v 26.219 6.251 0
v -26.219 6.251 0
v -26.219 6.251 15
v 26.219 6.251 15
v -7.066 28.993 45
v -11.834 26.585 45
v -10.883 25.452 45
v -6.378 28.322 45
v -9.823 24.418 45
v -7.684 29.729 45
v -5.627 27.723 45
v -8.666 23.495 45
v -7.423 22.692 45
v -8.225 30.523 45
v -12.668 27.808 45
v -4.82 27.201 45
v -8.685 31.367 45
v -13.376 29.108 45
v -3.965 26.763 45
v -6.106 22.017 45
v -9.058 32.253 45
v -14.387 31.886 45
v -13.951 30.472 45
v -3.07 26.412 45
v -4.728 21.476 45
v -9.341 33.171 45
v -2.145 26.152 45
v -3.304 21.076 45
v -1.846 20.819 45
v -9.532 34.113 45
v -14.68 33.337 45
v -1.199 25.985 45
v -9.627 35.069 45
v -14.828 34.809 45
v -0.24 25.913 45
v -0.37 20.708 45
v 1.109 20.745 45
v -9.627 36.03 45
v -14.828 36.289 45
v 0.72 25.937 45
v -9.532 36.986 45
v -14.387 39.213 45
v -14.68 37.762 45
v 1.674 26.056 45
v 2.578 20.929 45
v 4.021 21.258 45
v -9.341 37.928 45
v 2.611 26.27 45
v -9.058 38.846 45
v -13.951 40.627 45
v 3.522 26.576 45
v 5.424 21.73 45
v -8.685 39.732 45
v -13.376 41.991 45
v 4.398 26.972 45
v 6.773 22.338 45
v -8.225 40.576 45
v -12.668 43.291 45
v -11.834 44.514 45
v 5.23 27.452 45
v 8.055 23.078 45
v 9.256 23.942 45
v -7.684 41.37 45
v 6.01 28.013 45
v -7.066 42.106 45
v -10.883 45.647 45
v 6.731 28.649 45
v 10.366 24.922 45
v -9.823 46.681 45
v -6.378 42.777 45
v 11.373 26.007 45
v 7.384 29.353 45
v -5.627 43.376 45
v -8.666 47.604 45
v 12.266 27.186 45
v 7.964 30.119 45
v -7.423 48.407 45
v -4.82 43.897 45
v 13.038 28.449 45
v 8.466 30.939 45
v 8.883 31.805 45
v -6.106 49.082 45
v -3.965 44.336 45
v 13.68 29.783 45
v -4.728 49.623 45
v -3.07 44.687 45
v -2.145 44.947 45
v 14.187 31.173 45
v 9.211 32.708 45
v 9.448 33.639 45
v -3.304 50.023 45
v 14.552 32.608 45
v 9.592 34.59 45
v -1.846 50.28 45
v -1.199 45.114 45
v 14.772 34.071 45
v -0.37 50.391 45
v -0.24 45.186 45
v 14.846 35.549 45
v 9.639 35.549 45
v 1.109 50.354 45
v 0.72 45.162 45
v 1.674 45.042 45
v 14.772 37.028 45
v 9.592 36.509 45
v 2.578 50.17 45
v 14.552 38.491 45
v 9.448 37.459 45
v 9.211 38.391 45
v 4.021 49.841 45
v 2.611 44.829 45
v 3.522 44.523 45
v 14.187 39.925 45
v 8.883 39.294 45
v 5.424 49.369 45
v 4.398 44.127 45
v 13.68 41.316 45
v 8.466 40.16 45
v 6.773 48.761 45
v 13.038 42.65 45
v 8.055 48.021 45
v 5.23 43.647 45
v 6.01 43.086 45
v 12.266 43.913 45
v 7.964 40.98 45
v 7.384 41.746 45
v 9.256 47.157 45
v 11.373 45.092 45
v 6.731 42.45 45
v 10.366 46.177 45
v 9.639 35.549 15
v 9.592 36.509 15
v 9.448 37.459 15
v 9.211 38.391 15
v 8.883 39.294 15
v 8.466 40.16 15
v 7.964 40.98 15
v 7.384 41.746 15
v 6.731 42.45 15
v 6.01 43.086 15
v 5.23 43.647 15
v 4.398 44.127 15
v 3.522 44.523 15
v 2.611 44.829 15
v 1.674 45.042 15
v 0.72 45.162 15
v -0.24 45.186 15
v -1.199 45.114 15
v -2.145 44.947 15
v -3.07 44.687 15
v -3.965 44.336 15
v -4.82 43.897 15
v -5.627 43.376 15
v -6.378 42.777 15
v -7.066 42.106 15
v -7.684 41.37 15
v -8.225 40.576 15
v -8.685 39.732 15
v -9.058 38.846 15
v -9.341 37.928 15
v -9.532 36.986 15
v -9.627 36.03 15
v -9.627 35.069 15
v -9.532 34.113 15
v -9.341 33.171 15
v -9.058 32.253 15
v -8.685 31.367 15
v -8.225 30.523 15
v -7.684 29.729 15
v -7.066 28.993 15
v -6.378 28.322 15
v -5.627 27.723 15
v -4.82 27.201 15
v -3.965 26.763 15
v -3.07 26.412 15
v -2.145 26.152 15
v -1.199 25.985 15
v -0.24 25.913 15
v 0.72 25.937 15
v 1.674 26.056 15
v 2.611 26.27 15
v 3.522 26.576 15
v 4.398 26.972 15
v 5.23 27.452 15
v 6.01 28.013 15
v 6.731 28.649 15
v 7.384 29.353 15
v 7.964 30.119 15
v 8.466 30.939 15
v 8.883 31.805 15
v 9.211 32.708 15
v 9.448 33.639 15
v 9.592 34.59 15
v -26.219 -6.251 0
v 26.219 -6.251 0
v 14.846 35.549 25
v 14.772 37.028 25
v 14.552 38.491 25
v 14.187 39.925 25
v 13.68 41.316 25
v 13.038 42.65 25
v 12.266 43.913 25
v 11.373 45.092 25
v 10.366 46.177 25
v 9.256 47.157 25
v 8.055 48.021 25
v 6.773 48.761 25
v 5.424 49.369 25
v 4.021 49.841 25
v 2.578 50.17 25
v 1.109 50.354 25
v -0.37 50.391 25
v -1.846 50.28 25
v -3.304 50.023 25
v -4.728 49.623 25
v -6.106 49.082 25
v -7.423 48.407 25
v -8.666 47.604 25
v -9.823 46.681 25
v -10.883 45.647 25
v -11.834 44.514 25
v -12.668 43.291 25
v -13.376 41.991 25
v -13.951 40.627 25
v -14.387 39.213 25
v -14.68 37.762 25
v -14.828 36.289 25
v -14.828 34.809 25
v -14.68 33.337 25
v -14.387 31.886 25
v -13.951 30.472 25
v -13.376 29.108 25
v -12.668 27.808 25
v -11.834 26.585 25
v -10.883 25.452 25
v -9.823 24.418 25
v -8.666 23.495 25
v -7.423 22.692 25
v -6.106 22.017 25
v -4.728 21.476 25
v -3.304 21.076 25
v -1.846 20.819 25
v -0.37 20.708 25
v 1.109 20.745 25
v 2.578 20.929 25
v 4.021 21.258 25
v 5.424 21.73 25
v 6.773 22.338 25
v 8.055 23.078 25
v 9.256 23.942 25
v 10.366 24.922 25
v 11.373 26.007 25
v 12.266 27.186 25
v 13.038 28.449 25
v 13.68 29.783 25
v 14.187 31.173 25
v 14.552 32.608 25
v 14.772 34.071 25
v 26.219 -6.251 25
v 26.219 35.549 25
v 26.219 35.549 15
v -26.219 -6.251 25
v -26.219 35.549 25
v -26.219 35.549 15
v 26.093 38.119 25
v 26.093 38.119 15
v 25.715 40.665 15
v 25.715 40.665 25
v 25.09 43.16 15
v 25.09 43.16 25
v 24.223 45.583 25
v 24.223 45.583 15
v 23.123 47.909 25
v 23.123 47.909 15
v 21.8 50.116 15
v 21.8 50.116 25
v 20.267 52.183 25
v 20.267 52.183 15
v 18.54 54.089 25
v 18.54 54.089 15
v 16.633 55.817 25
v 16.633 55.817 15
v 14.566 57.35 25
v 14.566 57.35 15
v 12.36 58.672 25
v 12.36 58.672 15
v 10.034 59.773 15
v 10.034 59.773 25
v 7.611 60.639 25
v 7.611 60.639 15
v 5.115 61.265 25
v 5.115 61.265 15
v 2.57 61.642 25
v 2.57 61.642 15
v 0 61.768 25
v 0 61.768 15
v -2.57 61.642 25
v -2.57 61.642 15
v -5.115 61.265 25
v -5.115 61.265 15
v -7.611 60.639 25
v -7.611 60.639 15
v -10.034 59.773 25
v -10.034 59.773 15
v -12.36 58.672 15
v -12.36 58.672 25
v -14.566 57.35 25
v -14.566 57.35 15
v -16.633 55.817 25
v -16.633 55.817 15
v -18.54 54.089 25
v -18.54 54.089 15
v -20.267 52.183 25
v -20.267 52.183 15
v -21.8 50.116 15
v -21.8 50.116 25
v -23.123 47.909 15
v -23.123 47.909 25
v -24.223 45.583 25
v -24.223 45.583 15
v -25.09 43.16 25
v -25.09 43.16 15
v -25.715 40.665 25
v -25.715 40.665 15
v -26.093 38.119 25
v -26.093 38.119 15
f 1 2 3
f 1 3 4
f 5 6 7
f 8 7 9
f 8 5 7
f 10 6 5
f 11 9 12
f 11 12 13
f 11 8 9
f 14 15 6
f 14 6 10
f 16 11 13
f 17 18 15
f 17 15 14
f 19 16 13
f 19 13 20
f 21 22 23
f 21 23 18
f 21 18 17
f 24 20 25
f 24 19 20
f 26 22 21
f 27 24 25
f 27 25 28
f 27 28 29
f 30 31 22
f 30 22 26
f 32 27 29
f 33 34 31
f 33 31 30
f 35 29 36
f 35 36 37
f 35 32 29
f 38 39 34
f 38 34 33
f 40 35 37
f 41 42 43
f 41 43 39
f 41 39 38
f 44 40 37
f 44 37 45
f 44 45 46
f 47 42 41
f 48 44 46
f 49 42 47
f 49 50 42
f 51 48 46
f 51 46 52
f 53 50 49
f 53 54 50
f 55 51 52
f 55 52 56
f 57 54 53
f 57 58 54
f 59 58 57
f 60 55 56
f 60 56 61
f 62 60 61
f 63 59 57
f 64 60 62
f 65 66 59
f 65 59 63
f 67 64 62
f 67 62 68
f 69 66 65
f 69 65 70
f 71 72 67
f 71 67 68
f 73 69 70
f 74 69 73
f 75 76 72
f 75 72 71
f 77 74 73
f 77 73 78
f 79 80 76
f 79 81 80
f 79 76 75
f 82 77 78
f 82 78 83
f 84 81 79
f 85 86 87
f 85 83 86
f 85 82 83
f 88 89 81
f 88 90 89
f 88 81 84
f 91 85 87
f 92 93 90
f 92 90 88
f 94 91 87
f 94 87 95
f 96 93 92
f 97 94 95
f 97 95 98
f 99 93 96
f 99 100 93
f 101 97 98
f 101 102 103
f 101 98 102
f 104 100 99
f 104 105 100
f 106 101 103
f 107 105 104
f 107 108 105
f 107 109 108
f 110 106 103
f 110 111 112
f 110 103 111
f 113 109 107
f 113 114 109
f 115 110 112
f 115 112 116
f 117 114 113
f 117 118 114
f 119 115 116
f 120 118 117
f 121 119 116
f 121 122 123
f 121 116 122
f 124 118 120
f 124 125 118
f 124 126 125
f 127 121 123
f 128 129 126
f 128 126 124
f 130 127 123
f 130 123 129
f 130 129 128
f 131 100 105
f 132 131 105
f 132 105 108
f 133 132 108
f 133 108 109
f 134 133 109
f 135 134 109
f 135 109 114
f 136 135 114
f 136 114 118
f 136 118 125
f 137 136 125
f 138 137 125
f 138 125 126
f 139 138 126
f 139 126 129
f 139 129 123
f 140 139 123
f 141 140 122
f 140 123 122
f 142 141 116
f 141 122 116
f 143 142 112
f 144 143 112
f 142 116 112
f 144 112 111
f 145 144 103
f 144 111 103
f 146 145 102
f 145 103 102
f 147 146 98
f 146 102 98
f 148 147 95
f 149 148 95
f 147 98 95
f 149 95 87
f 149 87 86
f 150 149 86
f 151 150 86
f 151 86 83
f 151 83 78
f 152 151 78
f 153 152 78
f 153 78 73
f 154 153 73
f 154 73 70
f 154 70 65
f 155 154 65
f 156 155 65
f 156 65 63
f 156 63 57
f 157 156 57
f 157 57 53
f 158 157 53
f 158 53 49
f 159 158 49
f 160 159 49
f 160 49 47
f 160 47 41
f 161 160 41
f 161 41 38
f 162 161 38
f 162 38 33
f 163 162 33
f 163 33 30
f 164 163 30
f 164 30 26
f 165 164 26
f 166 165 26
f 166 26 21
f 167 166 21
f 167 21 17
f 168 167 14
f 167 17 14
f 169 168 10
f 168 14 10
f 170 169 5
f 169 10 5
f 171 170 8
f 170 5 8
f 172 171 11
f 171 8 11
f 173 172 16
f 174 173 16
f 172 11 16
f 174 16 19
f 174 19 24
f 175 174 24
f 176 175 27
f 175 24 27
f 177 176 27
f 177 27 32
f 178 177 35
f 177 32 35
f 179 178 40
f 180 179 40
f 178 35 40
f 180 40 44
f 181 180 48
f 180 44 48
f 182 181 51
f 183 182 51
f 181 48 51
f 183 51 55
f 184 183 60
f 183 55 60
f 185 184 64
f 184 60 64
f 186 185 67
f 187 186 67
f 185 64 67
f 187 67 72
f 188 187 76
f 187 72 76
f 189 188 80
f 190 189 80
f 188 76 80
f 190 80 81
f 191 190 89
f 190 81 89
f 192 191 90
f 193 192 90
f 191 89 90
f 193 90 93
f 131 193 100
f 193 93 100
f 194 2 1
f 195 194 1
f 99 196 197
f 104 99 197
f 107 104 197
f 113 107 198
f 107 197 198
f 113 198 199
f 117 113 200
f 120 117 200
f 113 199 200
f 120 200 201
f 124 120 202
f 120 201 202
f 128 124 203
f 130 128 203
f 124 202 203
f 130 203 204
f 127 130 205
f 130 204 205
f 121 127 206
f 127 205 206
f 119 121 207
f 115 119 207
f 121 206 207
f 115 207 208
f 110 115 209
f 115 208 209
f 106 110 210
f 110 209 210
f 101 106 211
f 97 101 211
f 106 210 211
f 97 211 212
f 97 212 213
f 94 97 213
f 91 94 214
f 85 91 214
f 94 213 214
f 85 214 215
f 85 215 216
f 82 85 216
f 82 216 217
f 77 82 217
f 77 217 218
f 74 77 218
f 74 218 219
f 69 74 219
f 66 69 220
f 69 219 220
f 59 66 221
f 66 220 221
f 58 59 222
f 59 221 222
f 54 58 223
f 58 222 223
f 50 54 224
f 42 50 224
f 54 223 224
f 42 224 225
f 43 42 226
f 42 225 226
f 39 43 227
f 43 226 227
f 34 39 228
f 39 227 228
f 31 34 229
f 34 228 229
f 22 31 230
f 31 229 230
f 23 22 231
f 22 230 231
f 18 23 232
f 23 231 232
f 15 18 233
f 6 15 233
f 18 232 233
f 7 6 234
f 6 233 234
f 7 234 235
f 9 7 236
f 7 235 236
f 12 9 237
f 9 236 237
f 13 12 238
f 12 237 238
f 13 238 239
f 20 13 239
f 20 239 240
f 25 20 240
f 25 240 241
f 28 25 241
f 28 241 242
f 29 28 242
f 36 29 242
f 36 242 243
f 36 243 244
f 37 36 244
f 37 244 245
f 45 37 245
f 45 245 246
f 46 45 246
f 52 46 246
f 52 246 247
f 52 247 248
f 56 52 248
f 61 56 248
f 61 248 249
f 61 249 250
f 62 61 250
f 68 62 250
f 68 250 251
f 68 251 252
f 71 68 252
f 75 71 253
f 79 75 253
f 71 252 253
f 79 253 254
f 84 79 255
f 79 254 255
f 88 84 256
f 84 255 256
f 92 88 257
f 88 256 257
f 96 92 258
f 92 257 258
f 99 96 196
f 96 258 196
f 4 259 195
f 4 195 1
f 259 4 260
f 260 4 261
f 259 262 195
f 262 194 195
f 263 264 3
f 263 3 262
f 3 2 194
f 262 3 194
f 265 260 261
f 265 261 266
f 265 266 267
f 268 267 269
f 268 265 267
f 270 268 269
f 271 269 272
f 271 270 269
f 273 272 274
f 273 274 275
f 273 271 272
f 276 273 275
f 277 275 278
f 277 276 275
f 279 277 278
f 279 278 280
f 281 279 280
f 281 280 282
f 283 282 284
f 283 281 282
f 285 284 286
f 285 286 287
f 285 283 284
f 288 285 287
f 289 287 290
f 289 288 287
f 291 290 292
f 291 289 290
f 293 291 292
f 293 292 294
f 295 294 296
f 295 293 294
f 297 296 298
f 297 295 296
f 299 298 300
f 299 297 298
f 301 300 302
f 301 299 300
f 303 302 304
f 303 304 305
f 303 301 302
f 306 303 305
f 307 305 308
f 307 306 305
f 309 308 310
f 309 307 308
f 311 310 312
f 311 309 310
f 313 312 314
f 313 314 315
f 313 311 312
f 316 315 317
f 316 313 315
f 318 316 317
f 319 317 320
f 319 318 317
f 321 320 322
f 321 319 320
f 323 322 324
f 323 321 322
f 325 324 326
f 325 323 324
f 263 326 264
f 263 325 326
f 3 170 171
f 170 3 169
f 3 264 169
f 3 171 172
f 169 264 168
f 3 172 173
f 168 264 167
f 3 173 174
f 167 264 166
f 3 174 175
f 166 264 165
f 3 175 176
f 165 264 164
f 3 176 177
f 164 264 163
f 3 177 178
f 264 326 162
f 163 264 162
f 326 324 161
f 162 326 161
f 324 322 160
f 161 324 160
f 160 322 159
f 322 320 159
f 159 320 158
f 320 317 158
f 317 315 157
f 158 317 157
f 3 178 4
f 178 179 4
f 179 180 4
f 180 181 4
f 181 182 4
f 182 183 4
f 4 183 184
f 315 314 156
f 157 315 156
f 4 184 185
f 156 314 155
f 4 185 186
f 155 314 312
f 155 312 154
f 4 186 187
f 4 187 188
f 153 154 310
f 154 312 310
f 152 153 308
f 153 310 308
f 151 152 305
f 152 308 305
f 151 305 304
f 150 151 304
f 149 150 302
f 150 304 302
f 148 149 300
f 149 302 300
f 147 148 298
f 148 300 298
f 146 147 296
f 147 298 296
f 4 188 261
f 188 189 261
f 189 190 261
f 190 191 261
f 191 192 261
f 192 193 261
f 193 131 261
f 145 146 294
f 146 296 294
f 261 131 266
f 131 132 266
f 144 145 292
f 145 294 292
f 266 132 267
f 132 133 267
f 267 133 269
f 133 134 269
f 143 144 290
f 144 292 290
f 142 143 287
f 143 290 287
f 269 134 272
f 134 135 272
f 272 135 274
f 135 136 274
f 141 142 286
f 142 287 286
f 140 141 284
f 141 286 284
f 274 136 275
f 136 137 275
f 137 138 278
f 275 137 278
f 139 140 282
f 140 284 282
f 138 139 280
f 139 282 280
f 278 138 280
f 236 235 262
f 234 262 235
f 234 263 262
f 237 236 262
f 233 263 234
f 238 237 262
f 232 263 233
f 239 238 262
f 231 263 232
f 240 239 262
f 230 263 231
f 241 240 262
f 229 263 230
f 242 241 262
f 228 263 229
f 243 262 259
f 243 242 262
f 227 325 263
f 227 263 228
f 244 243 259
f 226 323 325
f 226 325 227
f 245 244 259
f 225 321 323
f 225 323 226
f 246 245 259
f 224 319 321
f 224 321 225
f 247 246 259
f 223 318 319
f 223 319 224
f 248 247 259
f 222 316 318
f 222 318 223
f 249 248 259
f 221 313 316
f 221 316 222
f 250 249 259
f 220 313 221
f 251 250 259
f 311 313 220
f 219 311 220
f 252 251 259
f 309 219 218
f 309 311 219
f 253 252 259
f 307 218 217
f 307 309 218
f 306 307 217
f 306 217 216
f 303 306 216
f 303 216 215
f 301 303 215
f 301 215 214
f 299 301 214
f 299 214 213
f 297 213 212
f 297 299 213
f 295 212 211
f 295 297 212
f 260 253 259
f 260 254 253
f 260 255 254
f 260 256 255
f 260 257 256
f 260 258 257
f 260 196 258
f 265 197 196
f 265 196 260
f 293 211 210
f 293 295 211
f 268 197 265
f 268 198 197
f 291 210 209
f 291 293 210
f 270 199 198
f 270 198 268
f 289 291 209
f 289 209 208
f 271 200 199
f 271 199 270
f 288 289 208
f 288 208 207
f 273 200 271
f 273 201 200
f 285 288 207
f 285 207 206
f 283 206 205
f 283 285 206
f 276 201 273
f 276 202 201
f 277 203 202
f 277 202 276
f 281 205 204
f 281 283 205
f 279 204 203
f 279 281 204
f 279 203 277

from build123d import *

# Parameters (mm, degrees)
F0_W     = 52.437798
F0_H     = 12.502962
F1_DEPTH = 15
F2_W     = 52.437798
F2_H     = 29.297988
F2_H_2   = 12.502962
F3_DEPTH = 10
F5_DEPTH = 10
F6_R     = 14.846163
F7_DEPTH = 20
F8_R     = 9.639432
F9_DEPTH = 45.001


with BuildPart() as f1:
    # F0 (on Top) → F1 (new body)
    with BuildSketch(Plane.XY):
        Rectangle(F0_W, F0_H)
    extrude(amount=F1_DEPTH)

    # F2 (on face) → F3 (join)
    with BuildSketch(Plane.XY.offset(15)):
        with Locations((0, 20.900475)):
            Rectangle(F2_W, F2_H)
        Rectangle(F2_W, F2_H_2)
    extrude(amount=F3_DEPTH)

    # F4 (on face) → F5 (join)
    with BuildSketch(Plane.XY.offset(25)):
        with BuildLine():
            Line((-26.218899, 35.549469), (26.218899, 35.549469))
            ThreePointArc((26.218899, 35.549469), (0, 61.768368), (-26.218899, 35.549469))
        make_face()
    extrude(amount=-F5_DEPTH)

    # F6 (on face) → F7 (join)
    with BuildSketch(Plane.XY.offset(25)):
        with Locations((0, 35.549469)):
            Circle(F6_R)
    extrude(amount=F7_DEPTH)

    # F8 (on face) → F9 (cut, through all)
    with BuildSketch(Plane.XY.offset(45)):
        with Locations((0, 35.549469)):
            Circle(F8_R)
    extrude(amount=-F9_DEPTH, mode=Mode.SUBTRACT)


solid = f1.part
